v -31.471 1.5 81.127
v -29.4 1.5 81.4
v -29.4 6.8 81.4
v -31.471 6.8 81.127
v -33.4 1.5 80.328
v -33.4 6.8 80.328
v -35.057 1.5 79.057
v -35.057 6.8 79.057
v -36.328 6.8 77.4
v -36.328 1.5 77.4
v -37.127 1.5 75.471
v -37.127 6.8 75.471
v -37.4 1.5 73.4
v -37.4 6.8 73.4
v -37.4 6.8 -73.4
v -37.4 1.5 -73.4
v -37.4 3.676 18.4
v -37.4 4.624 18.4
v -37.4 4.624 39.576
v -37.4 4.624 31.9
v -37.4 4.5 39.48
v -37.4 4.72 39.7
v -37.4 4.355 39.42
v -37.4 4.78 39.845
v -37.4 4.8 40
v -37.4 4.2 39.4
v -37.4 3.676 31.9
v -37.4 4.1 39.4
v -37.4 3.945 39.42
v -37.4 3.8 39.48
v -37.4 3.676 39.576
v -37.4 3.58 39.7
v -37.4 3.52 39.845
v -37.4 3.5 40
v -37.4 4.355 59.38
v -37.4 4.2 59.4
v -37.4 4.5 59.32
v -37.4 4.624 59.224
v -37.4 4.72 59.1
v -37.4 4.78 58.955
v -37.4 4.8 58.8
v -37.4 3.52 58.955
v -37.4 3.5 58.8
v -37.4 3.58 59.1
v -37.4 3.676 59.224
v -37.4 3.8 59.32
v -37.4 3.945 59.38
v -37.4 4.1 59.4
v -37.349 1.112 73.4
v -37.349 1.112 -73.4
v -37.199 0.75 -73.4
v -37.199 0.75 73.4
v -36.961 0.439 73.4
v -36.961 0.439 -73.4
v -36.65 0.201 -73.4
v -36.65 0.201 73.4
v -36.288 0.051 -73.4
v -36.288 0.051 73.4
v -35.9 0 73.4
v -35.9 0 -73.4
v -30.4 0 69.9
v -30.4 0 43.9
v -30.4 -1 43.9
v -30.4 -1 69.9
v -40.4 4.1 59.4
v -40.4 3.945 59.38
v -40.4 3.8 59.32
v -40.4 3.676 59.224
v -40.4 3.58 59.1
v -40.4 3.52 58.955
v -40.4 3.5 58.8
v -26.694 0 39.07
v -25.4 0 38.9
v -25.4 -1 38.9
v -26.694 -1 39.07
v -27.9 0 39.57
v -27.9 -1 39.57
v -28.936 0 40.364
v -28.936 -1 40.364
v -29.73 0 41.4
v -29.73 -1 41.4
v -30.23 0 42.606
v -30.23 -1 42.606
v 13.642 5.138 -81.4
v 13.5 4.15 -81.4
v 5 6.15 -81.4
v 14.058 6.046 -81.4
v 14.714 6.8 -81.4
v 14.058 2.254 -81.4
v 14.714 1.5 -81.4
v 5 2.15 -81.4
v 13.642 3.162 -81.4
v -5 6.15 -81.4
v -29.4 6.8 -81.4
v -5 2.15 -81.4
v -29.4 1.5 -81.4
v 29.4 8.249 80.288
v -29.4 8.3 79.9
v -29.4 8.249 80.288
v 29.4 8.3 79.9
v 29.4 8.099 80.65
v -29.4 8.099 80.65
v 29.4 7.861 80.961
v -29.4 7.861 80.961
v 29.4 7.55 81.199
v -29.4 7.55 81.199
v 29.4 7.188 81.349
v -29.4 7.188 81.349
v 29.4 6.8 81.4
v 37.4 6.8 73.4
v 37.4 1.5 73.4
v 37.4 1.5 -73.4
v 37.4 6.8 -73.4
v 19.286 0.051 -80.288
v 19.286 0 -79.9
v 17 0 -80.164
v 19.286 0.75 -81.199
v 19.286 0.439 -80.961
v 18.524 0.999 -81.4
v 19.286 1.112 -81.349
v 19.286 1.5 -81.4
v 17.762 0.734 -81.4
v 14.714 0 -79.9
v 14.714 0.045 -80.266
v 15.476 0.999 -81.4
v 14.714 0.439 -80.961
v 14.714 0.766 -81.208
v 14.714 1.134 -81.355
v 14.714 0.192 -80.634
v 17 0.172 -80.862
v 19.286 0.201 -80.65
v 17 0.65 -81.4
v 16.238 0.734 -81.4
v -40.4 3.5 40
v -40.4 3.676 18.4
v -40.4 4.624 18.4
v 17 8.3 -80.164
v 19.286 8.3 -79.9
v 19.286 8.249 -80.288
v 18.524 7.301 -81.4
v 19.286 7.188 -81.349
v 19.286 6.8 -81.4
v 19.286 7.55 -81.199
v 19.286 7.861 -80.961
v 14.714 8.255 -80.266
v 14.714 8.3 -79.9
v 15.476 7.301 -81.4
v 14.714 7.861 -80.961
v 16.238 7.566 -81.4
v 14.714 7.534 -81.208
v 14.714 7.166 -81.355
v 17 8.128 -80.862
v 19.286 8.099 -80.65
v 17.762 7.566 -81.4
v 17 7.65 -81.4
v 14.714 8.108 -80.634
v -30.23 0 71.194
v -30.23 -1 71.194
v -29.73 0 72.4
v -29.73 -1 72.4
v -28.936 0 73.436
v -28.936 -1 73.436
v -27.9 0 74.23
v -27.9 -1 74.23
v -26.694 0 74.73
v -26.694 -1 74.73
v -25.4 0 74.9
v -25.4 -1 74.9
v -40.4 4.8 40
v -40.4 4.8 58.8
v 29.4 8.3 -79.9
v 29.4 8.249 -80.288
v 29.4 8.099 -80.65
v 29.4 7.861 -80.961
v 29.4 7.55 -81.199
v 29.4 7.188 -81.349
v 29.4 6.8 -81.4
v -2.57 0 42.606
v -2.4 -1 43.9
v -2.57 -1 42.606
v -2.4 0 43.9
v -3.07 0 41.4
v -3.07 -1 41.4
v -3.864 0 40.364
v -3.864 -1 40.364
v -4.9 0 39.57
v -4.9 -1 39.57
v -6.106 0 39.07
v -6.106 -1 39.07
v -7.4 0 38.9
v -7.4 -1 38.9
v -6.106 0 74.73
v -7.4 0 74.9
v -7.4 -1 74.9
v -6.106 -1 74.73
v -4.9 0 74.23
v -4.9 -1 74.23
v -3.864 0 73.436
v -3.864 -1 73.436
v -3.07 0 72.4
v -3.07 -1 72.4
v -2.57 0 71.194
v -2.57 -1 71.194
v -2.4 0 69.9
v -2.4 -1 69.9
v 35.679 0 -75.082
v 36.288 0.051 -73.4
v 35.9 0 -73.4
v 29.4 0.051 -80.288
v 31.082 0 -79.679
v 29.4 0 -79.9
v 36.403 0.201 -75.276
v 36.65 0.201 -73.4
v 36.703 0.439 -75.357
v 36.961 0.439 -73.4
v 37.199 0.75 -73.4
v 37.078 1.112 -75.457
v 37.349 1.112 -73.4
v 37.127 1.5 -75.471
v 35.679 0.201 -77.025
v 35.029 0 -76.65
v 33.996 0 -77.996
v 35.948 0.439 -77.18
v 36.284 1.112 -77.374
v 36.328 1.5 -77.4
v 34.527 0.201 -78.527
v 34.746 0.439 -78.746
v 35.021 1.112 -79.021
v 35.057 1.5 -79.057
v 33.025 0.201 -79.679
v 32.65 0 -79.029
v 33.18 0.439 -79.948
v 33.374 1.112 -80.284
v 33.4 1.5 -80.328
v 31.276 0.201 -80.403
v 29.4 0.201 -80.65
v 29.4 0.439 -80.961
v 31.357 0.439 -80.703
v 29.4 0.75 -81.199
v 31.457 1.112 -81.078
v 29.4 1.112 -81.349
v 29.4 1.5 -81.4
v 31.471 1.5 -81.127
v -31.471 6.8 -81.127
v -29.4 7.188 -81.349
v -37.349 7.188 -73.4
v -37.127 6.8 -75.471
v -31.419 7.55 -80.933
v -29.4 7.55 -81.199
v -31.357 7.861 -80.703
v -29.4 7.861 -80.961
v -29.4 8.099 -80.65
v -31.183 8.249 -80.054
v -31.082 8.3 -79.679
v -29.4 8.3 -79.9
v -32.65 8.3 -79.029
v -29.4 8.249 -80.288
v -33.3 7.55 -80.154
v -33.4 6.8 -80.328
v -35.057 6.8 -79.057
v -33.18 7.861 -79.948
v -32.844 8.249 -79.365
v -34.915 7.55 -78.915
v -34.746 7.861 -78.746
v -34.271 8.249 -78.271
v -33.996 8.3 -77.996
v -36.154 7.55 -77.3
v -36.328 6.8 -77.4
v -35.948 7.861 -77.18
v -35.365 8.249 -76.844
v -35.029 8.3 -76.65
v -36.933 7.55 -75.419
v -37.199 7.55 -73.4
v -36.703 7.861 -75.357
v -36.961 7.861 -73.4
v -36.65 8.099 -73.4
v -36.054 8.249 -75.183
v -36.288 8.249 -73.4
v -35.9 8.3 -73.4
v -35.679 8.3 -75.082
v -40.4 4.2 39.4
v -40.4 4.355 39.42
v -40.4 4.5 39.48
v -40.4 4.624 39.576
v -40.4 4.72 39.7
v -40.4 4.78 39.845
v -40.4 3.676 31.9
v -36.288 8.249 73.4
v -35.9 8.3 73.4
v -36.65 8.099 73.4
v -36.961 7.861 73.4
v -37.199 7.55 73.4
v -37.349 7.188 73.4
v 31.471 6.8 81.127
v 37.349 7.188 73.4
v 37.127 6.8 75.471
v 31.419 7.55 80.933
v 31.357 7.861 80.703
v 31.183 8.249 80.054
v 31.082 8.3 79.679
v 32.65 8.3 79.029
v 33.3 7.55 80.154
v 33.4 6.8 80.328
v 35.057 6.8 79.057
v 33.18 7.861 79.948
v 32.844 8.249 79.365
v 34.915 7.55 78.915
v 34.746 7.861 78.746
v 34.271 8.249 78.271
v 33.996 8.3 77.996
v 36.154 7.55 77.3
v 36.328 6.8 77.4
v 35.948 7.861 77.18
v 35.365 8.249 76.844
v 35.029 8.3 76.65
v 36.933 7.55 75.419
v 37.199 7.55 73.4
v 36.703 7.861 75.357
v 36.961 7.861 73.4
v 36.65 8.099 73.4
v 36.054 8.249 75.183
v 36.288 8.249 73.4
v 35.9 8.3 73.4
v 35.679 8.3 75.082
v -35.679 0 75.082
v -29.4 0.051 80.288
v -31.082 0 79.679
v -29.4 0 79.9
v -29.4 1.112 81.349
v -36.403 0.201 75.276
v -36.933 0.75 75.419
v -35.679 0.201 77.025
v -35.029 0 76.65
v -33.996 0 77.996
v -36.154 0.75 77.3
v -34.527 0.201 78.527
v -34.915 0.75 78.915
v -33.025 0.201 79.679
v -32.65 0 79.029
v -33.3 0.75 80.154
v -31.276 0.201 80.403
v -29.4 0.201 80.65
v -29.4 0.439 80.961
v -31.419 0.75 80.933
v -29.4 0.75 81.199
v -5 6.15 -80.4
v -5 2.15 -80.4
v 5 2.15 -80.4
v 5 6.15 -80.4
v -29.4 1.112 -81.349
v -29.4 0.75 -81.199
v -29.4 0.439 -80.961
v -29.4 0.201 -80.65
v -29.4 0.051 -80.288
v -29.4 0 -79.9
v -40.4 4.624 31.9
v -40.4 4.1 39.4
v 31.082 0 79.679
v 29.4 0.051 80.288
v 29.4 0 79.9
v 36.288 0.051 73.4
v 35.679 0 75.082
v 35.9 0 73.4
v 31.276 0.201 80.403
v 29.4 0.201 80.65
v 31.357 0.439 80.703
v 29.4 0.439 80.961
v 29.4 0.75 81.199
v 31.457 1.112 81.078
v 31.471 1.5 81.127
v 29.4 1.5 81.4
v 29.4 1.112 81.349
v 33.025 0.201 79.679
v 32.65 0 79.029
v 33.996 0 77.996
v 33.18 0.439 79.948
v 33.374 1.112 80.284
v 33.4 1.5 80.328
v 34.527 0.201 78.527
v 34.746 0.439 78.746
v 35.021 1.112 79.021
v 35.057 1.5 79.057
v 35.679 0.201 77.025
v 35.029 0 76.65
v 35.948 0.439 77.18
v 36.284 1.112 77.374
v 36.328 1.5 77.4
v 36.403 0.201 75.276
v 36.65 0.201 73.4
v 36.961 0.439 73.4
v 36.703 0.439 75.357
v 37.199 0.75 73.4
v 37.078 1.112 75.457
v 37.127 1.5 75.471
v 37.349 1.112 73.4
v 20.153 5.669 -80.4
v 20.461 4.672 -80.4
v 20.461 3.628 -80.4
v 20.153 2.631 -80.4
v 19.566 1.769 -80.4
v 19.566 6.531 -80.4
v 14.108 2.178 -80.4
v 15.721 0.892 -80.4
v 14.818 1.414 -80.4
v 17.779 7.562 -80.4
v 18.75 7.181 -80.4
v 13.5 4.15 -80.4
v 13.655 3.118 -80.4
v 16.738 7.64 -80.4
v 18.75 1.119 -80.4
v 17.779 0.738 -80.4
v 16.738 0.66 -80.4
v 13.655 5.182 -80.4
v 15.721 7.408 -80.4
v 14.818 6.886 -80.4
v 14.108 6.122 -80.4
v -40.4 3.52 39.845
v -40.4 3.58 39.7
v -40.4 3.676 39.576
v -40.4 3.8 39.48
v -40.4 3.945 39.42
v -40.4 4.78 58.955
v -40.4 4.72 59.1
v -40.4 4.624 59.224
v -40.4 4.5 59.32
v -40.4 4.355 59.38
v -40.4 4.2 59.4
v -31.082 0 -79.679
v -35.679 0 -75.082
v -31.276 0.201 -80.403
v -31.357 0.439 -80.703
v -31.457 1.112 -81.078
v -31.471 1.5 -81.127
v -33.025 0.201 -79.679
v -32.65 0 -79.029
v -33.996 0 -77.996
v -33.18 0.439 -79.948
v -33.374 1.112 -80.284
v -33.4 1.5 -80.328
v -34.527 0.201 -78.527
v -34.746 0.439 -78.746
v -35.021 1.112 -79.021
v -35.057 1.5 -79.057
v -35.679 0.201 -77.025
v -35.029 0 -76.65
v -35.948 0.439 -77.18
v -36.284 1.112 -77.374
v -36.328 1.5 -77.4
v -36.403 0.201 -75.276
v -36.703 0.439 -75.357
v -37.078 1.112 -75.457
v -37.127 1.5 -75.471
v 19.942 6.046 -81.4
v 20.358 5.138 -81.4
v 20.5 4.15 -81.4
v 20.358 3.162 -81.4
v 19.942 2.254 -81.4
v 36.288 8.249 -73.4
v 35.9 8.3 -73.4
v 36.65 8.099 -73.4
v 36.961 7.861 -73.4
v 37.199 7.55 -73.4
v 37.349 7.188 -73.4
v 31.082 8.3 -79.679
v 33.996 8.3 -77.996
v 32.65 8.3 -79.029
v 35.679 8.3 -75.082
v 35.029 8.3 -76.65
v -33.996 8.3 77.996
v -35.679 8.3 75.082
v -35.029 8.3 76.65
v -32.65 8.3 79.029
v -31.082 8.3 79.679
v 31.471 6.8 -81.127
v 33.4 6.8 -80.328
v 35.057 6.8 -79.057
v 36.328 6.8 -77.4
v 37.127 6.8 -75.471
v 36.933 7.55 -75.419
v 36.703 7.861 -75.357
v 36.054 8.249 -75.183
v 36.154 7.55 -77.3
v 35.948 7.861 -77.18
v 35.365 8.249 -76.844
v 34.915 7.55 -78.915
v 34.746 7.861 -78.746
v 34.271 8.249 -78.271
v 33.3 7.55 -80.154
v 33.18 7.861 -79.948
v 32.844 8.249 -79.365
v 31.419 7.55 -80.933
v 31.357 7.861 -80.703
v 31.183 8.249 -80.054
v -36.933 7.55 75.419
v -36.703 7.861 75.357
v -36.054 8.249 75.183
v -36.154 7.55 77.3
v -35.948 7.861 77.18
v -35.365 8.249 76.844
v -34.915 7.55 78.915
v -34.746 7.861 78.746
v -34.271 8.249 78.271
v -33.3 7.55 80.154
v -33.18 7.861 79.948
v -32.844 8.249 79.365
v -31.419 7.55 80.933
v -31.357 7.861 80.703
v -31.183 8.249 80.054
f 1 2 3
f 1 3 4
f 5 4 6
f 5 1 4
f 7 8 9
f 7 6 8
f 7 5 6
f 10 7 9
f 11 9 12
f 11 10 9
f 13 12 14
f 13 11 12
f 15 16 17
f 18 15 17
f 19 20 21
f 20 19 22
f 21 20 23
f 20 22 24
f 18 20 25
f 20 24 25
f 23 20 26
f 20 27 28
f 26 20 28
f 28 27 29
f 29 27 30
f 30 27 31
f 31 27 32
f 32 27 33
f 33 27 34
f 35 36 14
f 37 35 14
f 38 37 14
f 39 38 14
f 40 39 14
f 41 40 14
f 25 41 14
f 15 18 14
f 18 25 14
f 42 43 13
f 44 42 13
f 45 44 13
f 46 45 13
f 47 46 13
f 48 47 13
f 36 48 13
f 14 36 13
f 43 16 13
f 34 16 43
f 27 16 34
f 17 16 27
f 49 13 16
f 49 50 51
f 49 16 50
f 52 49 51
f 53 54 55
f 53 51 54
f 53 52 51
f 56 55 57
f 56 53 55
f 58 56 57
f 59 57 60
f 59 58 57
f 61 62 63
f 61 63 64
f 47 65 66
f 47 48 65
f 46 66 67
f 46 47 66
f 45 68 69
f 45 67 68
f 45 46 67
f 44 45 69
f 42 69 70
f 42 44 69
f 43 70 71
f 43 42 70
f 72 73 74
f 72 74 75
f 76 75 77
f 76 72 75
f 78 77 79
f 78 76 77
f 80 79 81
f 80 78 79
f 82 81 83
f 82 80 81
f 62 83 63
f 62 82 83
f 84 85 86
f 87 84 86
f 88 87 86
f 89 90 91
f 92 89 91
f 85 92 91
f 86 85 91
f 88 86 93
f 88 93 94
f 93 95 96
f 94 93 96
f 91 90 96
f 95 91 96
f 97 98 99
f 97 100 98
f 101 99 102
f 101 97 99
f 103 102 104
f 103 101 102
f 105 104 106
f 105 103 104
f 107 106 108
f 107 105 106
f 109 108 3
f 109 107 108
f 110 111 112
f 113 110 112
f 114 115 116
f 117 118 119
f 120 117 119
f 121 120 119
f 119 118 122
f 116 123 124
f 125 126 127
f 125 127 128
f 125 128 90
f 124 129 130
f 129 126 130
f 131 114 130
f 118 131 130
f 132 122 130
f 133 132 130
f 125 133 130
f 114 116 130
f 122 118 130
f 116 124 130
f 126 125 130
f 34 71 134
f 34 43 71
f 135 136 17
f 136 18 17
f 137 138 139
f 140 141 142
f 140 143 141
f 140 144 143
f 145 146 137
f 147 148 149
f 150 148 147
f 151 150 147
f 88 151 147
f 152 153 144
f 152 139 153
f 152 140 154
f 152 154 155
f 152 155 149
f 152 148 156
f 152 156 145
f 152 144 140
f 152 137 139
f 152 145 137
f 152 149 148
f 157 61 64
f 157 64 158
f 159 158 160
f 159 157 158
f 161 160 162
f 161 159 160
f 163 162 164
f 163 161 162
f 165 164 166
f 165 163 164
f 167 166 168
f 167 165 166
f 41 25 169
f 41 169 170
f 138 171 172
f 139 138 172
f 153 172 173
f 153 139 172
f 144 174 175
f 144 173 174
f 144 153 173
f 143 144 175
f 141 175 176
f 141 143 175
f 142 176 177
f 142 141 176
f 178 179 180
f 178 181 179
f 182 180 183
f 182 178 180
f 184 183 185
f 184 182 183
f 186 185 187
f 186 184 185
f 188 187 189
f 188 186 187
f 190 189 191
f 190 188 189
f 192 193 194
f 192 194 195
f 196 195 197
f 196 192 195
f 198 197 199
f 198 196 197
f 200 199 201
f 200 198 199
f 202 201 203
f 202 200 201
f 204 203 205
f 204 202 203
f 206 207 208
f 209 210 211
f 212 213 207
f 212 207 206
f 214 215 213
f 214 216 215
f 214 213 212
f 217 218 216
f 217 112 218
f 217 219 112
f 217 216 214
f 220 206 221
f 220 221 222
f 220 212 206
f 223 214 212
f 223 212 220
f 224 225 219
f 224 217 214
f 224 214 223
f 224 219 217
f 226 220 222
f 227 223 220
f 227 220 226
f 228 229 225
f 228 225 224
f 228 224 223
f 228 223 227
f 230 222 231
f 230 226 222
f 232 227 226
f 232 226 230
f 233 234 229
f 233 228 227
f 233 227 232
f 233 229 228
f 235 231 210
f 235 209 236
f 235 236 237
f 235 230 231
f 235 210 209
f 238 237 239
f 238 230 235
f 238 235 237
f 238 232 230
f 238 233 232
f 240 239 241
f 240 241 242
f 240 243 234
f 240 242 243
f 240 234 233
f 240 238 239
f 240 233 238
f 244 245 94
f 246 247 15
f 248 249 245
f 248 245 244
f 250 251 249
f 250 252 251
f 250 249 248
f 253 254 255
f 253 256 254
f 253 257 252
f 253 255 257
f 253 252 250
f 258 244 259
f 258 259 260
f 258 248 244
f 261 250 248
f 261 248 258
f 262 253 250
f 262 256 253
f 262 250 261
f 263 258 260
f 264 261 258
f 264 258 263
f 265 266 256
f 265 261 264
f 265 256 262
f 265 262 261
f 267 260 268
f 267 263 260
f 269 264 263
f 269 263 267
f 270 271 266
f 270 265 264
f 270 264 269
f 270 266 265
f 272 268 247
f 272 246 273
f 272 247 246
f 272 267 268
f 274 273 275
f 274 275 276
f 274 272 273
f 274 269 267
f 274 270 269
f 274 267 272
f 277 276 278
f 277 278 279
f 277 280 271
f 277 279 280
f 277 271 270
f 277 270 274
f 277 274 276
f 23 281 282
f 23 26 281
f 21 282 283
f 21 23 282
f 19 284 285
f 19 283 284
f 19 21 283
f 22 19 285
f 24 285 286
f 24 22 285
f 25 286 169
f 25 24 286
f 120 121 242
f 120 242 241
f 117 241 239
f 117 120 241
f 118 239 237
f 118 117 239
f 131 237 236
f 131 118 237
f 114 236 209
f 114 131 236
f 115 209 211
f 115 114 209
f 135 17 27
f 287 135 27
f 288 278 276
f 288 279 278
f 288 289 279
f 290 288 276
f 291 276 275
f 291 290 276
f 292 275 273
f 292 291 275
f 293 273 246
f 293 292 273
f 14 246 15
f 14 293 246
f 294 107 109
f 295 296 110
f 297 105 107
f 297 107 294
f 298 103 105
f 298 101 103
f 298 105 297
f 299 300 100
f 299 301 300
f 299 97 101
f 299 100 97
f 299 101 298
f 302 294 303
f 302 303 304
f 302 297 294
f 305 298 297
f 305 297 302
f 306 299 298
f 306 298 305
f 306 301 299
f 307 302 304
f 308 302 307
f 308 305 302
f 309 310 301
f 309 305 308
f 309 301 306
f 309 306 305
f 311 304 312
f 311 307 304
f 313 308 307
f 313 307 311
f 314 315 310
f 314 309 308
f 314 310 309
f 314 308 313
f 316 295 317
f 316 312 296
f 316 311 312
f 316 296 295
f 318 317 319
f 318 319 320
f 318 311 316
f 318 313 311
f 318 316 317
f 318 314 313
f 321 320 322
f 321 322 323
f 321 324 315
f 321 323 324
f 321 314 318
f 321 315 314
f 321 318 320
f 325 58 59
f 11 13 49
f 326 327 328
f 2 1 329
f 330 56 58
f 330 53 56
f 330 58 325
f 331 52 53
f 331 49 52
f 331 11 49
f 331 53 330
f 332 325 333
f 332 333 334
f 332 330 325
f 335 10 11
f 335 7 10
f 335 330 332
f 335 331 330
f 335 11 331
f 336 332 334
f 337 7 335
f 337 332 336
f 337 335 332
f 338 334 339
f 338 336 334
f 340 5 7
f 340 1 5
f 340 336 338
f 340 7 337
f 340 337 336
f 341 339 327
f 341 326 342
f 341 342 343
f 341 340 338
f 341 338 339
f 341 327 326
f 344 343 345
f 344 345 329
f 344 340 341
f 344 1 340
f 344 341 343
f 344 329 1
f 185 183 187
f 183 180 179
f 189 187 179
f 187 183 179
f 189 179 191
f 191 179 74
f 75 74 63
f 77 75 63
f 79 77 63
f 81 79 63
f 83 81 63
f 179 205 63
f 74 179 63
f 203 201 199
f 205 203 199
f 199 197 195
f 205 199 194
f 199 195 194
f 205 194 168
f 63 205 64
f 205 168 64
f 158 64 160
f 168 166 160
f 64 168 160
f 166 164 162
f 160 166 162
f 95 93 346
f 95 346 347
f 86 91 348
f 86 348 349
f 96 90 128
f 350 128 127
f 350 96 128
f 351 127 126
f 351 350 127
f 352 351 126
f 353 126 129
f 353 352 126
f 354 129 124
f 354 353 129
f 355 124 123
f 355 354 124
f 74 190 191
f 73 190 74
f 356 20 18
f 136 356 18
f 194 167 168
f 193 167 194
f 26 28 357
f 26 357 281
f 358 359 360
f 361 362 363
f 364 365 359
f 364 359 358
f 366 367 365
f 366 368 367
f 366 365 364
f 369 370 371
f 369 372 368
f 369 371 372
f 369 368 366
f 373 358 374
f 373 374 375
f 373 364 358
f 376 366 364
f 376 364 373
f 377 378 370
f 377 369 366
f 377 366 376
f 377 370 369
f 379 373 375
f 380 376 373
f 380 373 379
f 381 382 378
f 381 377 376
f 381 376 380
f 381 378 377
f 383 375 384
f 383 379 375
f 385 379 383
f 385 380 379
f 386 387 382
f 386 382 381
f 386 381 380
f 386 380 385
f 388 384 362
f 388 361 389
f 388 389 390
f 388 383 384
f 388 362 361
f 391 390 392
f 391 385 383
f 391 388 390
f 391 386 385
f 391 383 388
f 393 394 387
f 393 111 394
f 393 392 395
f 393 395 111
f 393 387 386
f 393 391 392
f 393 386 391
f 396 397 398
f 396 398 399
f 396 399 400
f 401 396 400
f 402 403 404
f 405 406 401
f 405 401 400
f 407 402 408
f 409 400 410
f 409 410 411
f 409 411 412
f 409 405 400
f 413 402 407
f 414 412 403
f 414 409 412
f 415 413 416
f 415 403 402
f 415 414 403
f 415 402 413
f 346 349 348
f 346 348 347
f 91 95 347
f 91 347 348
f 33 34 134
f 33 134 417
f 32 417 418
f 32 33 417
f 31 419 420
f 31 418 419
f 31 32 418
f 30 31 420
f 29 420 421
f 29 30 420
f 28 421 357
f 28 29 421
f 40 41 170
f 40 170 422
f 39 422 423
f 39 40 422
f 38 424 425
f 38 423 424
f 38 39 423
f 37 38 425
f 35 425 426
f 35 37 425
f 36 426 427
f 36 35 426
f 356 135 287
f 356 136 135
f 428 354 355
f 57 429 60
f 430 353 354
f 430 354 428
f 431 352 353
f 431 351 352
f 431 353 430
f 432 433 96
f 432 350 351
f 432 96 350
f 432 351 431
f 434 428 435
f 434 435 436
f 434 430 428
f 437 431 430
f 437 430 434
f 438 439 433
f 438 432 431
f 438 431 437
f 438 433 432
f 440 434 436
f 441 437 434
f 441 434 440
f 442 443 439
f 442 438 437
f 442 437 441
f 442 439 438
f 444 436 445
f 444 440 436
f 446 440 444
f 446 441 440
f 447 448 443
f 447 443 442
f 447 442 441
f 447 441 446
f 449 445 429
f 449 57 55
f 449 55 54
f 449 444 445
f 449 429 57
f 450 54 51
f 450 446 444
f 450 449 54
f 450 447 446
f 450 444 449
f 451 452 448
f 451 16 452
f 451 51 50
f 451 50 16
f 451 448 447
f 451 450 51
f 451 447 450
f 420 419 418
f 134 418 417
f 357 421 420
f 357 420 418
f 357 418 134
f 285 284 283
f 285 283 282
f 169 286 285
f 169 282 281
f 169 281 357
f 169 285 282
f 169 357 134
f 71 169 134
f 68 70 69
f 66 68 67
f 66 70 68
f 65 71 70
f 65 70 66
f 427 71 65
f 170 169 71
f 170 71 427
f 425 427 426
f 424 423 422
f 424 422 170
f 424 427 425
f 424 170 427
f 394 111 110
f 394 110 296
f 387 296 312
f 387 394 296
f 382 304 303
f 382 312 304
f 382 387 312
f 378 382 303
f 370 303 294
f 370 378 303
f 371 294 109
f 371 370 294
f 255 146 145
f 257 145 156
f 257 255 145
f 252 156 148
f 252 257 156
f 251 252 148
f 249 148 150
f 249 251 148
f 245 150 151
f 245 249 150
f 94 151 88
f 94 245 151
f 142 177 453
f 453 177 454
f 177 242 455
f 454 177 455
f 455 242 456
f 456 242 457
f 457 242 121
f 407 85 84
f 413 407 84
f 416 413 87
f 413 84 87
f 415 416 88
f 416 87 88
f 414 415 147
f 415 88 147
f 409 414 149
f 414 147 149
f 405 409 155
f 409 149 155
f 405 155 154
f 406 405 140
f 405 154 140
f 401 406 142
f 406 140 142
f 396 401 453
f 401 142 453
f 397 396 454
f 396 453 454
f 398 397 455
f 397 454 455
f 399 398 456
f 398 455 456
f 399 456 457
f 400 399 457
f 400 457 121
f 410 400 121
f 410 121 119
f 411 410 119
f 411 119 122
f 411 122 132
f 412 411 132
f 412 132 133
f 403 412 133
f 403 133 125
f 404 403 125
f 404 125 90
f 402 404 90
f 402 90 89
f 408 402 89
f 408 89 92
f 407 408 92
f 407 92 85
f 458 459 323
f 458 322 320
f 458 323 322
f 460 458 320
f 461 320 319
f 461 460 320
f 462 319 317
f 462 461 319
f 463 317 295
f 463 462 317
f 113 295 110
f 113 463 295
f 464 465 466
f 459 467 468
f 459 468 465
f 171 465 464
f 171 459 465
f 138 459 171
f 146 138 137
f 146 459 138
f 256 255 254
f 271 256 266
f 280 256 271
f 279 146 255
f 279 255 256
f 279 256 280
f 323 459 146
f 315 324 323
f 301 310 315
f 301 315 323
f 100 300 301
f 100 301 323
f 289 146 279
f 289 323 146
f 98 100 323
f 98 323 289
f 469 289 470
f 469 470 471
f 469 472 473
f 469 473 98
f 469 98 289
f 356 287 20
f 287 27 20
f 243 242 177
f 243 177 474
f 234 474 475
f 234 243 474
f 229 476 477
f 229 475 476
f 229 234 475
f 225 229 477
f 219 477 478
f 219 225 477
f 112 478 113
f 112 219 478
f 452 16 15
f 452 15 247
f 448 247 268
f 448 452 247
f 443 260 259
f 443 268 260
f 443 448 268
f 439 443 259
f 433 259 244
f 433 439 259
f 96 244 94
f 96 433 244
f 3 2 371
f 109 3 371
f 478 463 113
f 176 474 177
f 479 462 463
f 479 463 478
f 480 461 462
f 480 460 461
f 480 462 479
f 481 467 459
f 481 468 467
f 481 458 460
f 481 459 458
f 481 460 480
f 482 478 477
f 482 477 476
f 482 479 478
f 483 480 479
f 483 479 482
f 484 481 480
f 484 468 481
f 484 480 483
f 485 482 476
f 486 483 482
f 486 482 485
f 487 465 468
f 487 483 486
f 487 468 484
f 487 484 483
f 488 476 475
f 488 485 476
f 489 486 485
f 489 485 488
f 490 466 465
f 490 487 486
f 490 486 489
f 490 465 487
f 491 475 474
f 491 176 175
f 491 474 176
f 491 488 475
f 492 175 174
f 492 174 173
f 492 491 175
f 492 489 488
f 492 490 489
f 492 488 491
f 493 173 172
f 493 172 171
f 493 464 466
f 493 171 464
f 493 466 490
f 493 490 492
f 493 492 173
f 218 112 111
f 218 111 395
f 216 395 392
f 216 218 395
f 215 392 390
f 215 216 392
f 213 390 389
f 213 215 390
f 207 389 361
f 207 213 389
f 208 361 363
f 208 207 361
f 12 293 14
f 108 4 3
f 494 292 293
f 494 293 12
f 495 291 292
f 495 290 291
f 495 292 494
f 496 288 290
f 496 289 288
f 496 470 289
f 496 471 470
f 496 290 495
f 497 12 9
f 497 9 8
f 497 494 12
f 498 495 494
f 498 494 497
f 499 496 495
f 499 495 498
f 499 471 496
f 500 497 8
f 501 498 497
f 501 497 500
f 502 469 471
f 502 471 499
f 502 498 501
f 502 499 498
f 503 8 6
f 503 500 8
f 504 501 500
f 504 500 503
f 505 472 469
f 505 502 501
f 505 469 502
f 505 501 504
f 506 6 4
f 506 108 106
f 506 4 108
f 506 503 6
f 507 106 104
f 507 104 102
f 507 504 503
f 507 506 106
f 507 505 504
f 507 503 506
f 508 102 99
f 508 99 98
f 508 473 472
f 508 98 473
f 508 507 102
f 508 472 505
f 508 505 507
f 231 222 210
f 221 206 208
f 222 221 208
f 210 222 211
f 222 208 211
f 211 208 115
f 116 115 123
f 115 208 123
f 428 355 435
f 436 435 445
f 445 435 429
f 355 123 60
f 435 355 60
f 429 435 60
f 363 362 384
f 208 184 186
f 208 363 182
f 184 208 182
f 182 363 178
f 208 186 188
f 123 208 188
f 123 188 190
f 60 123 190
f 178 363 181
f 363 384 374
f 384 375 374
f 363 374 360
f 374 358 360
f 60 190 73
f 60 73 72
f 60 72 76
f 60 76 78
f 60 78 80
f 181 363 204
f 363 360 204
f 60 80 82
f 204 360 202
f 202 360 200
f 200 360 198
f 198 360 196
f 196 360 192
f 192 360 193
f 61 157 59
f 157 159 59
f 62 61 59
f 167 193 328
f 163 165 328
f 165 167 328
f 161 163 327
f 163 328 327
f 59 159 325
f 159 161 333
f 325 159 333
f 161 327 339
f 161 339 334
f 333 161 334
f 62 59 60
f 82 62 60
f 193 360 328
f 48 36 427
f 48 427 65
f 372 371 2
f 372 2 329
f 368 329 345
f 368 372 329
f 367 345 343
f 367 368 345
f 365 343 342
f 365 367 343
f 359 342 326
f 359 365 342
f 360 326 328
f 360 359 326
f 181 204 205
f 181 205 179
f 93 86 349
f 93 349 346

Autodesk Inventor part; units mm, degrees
ref_plane "YZ Plane" through (0, 0, 0) normal (1, 0, 0) x (0, 1, 0)
ref_plane "XY Plane" through (0, 0, 0) normal (0, 0, 1) x (1, 0, 0)
sketch "BASEsc" plane through (0, 0, 0) normal (0, 1, 0) x (-1, 0, 0)
  line L0 (-29.4, -81.4) -> (29.4, -81.4)
  line L1 (37.4, -73.4) -> (37.4, 73.4)
  line L2 (29.4, 81.4) -> (-29.4, 81.4)
  line L3 (-37.4, 73.4) -> (-37.4, -73.4)
  line L4 (-37.4, -81.4) -> (37.4, 81.4) construction
  line L5 (37.4, -81.4) -> (-37.4, 81.4) construction
  arc A0 (37.4, 73.4) -> (29.4, 81.4) centre (29.4, 73.4) ccw
  arc A1 (-29.4, 81.4) -> (-37.4, 73.4) centre (-29.4, 73.4) ccw
  arc A2 (-37.4, -73.4) -> (-29.4, -81.4) centre (-29.4, -73.4) ccw
  arc A3 (29.4, -81.4) -> (37.4, -73.4) centre (29.4, -73.4) ccw
  line L6 (25.4, 74.9) -> (7.4, 74.9)
  line L7 (2.4, 69.9) -> (2.4, 43.9)
  line L8 (7.4, 38.9) -> (25.4, 38.9)
  line L9 (30.4, 43.9) -> (30.4, 69.9)
  line L10 (30.4, 74.9) -> (2.4, 38.9) construction
  line L11 (2.4, 74.9) -> (30.4, 38.9) construction
  arc A4 (30.4, 69.9) -> (25.4, 74.9) centre (25.4, 69.9) ccw
  arc A5 (7.4, 74.9) -> (2.4, 69.9) centre (7.4, 69.9) ccw
  arc A6 (25.4, 38.9) -> (30.4, 43.9) centre (25.4, 43.9) ccw
  arc A7 (2.4, 43.9) -> (7.4, 38.9) centre (7.4, 43.9) ccw
  point P0 (0, 0)
  point P1 (16.4, 56.9)
  dimension "d0" = 74.8
  dimension "d1" = 162.8
  dimension "d2" = 8
  dimension "d3" = 8
  dimension "d4" = 8
  dimension "d7" = 28
  dimension "d8" = 36
  dimension "d9" = 5
  dimension "d26" = 42.5
  dimension "d27" = 35
extrude "押し出し1" add sketch "BASEsc" along normal blind 8.3 contours A2 L3 A1 L2 A0 L1 A3 L0 | A4 L9 A6 L8 A7 L7 A5 L6
extrude "押し出し2" add sketch "BASEsc" against normal blind 1 contours A4 L9 A6 L8 A7 L7 A5 L6
sketch "スケッチ2" plane through (-37.4, 0, -73.4) normal (-1, 0, 0) x (0, 0, 1)
  line L0 (143.2215, 4.15) -> (137.7549, 4.15) construction
  line L1 (0, 8.3) -> (146.8, 8.3) projected
  line L2 (132.2, 3.5) -> (113.4, 3.5)
  line L3 (112.8, 4.1) -> (112.8, 4.2)
  line L4 (113.4, 4.8) -> (132.2, 4.8)
  line L5 (132.8, 4.2) -> (132.8, 4.1)
  line L6 (132.8, 3.5) -> (112.8, 4.8) construction
  line L7 (112.8, 3.5) -> (132.8, 4.8) construction
  arc A0 (132.8, 4.2) -> (132.2, 4.8) centre (132.2, 4.2) ccw
  arc A1 (132.2, 3.5) -> (132.8, 4.1) centre (132.2, 4.1) ccw
  arc A2 (112.8, 4.1) -> (113.4, 3.5) centre (113.4, 4.1) ccw
  arc A3 (113.4, 4.8) -> (112.8, 4.2) centre (113.4, 4.2) ccw
  line L8 (154.8, 0) -> (154.8, 8.3) projected
  line L9 (105.3, 4.6243) -> (91.8, 4.6243)
  line L10 (91.8, 4.6243) -> (91.8, 3.6757)
  line L11 (91.8, 3.6757) -> (105.3, 3.6757)
  line L12 (105.3, 3.6757) -> (105.3, 4.6243)
  line L13 (105.3, 4.6243) -> (91.8, 3.6757) construction
  line L14 (91.8, 4.6243) -> (105.3, 3.6757) construction
  point P0 (73.4, 0)
  point P1 (140.4882, 4.15)
  point P2 (122.8, 4.15)
  point P3 (112.8, 4.15)
  point P4 (98.55, 4.15)
  point P5 (105.3, 4.15)
  dimension "d12" = 4.15
  dimension "d13" = 20
  dimension "d14" = 1.3
  dimension "d15" = 0.6
  dimension "d16" = 0.6
  dimension "d17" = 42
  dimension "d18" = 7.5
  dimension "d19" = 13.5
extrude "押し出し3" add sketch "スケッチ2" along normal blind 3
sketch "スケッチ3" plane through (29.4, 0, -81.4) normal (0, 0, -1) x (-1, 0, 0)
  line L0 (-8, 0) -> (-8, 8.3) projected
  line L1 (66.8, 0) -> (66.8, 8.3) projected
  line L2 (-8, 8.3) -> (66.8, 0) construction
  line L3 (66.8, 0) -> (66.8, 8.3)
  line L4 (0, 0) -> (-8, 0) projected
  line L5 (66.8, 8.3) -> (-8, 0) construction
  line L6 (24.4, 6.15) -> (34.4, 6.15)
  line L7 (34.4, 6.15) -> (34.4, 2.15)
  line L8 (34.4, 2.15) -> (24.4, 2.15)
  line L9 (24.4, 2.15) -> (24.4, 6.15)
  line L10 (24.4, 6.15) -> (34.4, 2.15) construction
  line L11 (34.4, 6.15) -> (24.4, 2.15) construction
  circle A0 centre (12.4, 4.15) radius 3.5
  point P0 (29.4, 0)
  point P1 (29.4, 4.15)
  point P2 (29.4, 4.15)
  dimension "d22" = 10
  dimension "d23" = 4
  dimension "d24" = 7
  dimension "d25" = 17
extrude "押し出し4" cut sketch "スケッチ3" against normal blind 1
fillet "フィレット1" radius 1.5 8 edges at (35.0569, 8.3, -79.0569) (0, 8.3, -81.4) (-35.0569, 8.3, -79.0569) (-37.4, 8.3, 0) (-35.0569, 8.3, 79.0569) (0, 8.3, 81.4) (35.0569, 8.3, 79.0569) (37.4, 8.3, 0)
fillet "フィレット2" radius 1.5 8 edges at (-35.0569, 0, 79.0569) (0, 0, 81.4) (35.0569, 0, 79.0569) (37.4, 0, 0) (35.0569, 0, -79.0569) (0, 0, -81.4) (-35.0569, 0, -79.0569) (-37.4, 0, 0)
equation "\"BendRadius\" = Thickness"
equation "\"BendReliefWidth\" = Thickness"
equation "\"BendReliefDepth\" = 0.5 * Thickness"
equation "\"CornerReliefSize\" = 4 * Thickness"
equation "\"MinimumRemnant\" = 2 * Thickness"
equation "\"TransitionRadius\" = BendRadius"
equation "\"JacobiRadiusSize\" = BendRadius"
equation "\"GapSize\" = Thickness"
equation "\"Thickness\" = 0.5"
properties part number "template"
